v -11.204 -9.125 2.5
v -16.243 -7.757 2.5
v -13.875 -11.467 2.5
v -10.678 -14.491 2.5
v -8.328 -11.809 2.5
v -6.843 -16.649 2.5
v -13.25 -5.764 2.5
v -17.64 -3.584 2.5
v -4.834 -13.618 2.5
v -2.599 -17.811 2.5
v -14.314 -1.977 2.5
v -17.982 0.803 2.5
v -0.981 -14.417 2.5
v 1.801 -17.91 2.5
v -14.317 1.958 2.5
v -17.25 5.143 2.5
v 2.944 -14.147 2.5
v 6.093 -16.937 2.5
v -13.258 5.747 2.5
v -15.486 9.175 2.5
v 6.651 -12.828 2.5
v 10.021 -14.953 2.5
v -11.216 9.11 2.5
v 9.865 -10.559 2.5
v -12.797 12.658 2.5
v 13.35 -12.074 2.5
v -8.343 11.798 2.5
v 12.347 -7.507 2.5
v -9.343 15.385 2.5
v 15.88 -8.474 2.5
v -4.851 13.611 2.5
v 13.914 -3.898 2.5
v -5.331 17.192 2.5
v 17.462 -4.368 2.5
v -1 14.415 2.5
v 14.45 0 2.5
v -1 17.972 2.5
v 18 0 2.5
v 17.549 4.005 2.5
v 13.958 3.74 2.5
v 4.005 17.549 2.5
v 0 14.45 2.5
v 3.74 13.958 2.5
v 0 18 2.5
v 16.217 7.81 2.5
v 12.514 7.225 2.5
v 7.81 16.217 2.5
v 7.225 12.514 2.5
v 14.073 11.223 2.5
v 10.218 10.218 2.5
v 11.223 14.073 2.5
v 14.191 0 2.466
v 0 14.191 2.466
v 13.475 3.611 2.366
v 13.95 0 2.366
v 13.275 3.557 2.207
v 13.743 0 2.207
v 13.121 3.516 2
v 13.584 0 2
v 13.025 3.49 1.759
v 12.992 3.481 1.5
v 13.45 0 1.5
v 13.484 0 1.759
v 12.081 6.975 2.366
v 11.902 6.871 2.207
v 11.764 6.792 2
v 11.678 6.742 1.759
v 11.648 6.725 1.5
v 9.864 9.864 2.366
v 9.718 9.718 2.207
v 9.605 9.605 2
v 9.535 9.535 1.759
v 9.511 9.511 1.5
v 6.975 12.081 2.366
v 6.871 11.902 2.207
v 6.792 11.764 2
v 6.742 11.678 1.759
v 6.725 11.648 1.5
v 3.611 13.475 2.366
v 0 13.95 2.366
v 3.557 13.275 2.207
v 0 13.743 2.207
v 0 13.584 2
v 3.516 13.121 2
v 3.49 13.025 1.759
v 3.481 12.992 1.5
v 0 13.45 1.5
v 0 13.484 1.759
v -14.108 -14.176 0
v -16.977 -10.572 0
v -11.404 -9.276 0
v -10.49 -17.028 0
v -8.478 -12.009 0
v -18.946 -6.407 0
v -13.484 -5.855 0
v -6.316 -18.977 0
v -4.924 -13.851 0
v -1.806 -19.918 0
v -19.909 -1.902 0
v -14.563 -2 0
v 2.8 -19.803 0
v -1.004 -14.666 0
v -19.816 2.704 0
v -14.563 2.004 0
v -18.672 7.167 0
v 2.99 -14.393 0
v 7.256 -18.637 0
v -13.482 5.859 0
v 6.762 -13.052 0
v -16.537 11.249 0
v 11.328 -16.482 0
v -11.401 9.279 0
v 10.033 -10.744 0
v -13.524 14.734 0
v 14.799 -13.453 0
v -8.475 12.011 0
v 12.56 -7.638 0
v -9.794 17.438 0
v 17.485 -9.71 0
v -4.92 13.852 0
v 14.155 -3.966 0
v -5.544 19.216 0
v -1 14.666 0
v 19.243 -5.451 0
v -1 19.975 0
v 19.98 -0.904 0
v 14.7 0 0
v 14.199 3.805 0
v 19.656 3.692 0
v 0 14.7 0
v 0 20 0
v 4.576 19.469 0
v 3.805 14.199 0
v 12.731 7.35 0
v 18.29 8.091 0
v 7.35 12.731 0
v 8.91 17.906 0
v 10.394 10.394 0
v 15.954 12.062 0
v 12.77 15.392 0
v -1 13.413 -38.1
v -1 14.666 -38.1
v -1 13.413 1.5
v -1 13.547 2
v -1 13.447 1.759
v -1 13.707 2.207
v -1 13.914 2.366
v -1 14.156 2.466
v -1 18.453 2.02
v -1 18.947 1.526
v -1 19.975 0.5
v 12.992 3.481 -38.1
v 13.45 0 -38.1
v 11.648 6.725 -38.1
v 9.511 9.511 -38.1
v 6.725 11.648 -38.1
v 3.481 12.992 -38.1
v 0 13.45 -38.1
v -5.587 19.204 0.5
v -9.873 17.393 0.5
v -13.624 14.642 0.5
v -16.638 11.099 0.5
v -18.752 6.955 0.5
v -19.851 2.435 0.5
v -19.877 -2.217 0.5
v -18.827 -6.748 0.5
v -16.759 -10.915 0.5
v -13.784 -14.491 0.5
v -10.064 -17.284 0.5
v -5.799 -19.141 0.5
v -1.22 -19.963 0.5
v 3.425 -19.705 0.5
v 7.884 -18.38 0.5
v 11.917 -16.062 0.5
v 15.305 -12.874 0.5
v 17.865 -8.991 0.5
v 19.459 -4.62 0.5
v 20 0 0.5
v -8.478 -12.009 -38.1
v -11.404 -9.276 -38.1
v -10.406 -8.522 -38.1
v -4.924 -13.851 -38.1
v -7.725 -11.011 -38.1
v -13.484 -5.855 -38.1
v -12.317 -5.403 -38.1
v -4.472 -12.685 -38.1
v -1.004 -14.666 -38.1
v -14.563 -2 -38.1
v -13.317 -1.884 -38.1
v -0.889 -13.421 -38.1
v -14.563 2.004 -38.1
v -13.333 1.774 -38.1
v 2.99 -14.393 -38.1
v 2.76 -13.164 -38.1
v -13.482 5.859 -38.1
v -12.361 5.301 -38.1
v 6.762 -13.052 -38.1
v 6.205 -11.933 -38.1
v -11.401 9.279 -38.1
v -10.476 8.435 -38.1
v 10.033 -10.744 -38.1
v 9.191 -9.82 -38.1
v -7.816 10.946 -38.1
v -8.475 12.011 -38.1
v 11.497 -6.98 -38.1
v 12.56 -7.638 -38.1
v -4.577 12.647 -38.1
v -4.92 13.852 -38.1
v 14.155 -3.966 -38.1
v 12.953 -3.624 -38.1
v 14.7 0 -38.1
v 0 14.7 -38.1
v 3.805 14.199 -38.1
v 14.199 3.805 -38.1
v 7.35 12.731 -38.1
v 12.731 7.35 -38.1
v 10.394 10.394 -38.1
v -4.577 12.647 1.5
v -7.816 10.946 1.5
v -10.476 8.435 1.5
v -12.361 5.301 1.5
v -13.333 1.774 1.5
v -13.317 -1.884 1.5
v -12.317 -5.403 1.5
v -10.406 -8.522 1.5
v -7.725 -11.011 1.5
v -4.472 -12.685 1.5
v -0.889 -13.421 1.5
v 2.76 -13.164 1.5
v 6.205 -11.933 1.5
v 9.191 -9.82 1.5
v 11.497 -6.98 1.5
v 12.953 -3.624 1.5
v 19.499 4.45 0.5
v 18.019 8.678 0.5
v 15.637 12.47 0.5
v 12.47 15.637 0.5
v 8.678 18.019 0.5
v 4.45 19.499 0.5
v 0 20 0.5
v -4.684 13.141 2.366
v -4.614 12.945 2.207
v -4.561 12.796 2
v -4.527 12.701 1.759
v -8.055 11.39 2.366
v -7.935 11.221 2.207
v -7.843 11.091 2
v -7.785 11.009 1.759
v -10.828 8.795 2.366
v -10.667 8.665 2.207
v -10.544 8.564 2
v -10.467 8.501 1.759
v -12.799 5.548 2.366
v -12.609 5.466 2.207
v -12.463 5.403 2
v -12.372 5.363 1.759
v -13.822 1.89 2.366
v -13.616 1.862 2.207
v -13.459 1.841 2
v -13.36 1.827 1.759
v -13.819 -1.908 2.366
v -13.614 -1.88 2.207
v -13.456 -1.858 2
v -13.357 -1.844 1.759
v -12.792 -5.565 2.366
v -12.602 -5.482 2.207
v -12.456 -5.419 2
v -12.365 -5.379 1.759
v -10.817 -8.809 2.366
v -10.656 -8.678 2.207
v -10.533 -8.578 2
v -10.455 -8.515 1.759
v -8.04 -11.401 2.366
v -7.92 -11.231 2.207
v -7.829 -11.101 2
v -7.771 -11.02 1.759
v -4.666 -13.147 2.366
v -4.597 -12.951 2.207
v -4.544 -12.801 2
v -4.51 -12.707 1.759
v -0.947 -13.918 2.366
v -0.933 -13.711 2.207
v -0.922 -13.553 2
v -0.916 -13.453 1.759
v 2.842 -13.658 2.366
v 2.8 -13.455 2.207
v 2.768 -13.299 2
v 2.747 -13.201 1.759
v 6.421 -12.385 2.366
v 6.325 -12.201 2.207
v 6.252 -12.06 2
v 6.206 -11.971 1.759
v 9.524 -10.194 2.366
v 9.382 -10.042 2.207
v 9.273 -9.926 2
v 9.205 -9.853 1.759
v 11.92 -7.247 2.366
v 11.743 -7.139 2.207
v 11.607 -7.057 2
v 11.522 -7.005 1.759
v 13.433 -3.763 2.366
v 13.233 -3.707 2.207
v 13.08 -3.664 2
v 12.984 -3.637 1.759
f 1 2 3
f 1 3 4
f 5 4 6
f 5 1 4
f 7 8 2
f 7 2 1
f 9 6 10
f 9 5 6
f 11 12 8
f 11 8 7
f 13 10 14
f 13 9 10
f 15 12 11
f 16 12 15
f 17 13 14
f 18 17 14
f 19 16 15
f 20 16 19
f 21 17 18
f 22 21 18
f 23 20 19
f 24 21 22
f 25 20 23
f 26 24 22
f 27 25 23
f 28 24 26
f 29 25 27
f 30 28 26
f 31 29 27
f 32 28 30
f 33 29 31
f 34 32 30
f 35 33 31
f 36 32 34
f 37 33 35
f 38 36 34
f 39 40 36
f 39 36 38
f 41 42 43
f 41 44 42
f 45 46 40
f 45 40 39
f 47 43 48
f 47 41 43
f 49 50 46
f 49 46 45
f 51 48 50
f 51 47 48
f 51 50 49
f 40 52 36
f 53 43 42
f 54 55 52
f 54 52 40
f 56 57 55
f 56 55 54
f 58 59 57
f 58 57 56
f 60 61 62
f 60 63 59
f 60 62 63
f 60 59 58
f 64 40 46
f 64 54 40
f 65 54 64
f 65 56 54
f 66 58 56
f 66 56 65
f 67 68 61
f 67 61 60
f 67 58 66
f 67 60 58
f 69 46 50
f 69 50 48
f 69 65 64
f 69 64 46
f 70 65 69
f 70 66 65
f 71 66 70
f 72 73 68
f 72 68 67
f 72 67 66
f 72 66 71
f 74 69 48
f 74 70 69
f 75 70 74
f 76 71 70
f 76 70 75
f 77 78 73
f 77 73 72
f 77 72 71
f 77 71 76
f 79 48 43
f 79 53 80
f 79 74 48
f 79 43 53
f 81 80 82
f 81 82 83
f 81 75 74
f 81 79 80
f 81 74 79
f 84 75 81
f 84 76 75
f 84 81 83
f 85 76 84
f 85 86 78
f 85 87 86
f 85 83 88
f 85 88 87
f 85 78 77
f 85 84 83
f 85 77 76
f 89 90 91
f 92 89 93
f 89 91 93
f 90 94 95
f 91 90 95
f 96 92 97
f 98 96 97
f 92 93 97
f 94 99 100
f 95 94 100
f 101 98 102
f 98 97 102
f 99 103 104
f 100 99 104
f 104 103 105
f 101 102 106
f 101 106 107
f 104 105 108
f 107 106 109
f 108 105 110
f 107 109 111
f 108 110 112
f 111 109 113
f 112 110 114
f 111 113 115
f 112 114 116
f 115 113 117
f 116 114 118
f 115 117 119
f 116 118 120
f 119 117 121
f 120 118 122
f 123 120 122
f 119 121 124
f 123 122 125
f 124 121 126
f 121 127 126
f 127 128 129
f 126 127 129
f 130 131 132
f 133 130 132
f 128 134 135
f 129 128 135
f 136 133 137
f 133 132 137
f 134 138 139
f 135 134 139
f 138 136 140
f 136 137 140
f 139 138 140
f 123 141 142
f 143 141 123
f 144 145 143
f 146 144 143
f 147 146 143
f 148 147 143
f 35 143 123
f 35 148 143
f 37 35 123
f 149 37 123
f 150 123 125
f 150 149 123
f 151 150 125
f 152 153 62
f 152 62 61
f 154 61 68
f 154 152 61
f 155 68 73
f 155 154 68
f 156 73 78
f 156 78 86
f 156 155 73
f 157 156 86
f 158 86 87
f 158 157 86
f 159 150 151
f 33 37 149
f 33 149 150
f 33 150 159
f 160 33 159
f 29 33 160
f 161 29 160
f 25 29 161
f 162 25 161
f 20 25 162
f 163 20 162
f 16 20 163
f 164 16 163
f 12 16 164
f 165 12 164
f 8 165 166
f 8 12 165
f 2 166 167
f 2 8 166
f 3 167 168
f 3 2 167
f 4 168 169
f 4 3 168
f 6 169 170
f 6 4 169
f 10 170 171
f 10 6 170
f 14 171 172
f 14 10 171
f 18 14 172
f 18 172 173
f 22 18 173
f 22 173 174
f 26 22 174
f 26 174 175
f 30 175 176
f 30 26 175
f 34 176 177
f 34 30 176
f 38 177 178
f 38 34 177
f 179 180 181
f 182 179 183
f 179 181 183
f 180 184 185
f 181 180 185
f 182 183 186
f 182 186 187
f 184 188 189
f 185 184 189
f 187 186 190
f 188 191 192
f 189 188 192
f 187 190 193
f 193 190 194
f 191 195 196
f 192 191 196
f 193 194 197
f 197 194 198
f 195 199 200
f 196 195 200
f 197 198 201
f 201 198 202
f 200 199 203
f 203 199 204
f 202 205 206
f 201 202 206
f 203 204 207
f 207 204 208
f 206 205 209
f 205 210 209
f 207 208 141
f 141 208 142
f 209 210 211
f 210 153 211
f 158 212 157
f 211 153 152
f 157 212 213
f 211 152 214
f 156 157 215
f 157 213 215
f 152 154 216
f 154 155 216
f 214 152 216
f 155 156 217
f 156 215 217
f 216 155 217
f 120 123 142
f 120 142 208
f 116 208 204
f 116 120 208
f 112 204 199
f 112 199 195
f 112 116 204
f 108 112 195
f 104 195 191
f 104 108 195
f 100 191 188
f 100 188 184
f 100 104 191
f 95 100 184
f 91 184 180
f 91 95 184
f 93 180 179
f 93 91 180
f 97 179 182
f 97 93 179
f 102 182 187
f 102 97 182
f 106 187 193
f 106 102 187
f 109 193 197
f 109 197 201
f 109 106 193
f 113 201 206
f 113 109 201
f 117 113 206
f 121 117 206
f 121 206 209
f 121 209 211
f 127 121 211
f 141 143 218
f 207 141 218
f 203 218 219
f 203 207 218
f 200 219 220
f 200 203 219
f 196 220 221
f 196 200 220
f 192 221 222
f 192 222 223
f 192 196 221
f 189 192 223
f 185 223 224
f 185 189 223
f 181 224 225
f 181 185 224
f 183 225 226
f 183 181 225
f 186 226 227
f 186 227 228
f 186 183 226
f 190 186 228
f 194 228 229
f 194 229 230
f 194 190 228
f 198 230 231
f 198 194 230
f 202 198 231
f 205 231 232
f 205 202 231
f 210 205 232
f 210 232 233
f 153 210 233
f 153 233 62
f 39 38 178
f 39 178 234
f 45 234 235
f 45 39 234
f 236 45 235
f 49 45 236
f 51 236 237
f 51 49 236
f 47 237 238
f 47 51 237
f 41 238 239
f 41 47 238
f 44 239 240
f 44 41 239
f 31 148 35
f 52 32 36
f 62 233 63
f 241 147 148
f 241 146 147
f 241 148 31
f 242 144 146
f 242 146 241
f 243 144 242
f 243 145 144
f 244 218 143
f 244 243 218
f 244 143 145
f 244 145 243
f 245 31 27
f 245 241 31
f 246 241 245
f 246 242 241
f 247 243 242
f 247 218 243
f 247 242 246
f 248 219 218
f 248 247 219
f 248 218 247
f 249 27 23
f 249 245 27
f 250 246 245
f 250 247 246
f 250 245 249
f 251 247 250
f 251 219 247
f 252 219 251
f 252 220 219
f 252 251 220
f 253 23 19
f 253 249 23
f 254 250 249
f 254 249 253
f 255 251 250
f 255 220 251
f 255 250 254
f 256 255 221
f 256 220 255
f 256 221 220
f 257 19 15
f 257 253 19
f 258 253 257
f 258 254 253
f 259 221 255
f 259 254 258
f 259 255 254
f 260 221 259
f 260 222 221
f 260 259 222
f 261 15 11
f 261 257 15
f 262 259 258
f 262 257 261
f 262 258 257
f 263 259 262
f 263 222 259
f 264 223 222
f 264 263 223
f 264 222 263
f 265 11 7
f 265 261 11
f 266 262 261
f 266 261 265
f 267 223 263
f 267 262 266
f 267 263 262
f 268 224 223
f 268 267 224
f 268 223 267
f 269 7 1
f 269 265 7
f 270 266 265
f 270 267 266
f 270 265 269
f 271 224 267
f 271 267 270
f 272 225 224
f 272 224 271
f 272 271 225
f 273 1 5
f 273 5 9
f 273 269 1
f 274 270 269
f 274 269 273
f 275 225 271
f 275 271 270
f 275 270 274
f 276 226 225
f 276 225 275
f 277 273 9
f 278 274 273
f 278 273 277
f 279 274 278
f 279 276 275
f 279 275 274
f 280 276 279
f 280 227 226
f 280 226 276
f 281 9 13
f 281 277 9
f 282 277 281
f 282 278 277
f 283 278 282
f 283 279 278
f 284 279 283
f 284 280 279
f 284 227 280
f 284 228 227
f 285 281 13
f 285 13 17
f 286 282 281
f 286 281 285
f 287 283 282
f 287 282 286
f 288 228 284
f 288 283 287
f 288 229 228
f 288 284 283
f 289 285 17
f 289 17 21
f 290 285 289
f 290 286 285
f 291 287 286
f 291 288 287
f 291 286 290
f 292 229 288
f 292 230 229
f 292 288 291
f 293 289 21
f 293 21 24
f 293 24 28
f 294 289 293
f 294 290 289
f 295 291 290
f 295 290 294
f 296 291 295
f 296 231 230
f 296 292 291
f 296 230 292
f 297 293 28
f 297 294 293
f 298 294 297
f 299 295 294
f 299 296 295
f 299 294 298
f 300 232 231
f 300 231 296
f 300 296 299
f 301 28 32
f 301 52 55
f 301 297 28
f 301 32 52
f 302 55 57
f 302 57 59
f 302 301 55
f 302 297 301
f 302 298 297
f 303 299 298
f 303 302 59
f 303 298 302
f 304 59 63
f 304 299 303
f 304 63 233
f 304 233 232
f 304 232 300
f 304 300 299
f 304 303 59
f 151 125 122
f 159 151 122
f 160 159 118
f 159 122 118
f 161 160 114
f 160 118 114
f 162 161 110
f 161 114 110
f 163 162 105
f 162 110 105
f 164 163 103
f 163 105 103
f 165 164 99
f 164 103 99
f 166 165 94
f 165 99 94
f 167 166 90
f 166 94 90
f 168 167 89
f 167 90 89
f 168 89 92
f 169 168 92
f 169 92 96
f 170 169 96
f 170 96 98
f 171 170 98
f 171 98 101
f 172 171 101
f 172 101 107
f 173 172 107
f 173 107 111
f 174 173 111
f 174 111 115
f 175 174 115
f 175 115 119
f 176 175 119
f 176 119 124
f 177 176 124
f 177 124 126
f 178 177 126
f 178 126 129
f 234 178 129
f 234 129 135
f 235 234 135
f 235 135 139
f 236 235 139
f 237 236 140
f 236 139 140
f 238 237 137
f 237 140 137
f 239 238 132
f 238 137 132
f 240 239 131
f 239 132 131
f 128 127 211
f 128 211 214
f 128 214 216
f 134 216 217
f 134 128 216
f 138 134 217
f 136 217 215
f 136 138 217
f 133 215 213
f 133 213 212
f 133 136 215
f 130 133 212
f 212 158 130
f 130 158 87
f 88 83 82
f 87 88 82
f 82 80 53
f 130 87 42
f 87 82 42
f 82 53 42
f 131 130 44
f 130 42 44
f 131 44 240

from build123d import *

# Parameters (mm, degrees)
F0_R     = 14.7
F0_R_2   = 13.45
F1_DEPTH = 38.1
F0_R_3   = 20
F2_DEPTH = 2.5
F3_SIZE  = 2
F4_R     = 1
F5_W     = 26.7045460641
F5_H     = 56.1363650486
F6_DEPTH = 1


with BuildPart() as f1:
    # F0 (on Top) → F1 (new body)
    with BuildSketch(Plane.XY):
        Circle(F0_R)
        Circle(F0_R_2, mode=Mode.SUBTRACT)
    extrude(amount=-F1_DEPTH)

    # F0 (on Top) → F2 (join)
    with BuildSketch(Plane.XY):
        Circle(F0_R_3)
        Circle(F0_R, mode=Mode.SUBTRACT)
        Circle(F0_R)
        Circle(F0_R_2, mode=Mode.SUBTRACT)
    extrude(amount=F2_DEPTH)

    # F3
    f3_edges = [f1.edges().sort_by_distance(p)[0] for p in [
        (-20, 0, 2.5),
    ]]
    chamfer(f3_edges, length=F3_SIZE)

    # F4
    f4_edges = [f1.edges().sort_by_distance(p)[0] for p in [
        (-13.45, 0, 2.5),
    ]]
    fillet(f4_edges, radius=F4_R)

    # F5 (on Right) → F6 (cut)
    with BuildSketch(Plane.YZ):
        with Locations((13.3522730321, -17.5000005402)):
            Rectangle(F5_W, F5_H)
    extrude(amount=-F6_DEPTH, mode=Mode.SUBTRACT)


solid = f1.part
